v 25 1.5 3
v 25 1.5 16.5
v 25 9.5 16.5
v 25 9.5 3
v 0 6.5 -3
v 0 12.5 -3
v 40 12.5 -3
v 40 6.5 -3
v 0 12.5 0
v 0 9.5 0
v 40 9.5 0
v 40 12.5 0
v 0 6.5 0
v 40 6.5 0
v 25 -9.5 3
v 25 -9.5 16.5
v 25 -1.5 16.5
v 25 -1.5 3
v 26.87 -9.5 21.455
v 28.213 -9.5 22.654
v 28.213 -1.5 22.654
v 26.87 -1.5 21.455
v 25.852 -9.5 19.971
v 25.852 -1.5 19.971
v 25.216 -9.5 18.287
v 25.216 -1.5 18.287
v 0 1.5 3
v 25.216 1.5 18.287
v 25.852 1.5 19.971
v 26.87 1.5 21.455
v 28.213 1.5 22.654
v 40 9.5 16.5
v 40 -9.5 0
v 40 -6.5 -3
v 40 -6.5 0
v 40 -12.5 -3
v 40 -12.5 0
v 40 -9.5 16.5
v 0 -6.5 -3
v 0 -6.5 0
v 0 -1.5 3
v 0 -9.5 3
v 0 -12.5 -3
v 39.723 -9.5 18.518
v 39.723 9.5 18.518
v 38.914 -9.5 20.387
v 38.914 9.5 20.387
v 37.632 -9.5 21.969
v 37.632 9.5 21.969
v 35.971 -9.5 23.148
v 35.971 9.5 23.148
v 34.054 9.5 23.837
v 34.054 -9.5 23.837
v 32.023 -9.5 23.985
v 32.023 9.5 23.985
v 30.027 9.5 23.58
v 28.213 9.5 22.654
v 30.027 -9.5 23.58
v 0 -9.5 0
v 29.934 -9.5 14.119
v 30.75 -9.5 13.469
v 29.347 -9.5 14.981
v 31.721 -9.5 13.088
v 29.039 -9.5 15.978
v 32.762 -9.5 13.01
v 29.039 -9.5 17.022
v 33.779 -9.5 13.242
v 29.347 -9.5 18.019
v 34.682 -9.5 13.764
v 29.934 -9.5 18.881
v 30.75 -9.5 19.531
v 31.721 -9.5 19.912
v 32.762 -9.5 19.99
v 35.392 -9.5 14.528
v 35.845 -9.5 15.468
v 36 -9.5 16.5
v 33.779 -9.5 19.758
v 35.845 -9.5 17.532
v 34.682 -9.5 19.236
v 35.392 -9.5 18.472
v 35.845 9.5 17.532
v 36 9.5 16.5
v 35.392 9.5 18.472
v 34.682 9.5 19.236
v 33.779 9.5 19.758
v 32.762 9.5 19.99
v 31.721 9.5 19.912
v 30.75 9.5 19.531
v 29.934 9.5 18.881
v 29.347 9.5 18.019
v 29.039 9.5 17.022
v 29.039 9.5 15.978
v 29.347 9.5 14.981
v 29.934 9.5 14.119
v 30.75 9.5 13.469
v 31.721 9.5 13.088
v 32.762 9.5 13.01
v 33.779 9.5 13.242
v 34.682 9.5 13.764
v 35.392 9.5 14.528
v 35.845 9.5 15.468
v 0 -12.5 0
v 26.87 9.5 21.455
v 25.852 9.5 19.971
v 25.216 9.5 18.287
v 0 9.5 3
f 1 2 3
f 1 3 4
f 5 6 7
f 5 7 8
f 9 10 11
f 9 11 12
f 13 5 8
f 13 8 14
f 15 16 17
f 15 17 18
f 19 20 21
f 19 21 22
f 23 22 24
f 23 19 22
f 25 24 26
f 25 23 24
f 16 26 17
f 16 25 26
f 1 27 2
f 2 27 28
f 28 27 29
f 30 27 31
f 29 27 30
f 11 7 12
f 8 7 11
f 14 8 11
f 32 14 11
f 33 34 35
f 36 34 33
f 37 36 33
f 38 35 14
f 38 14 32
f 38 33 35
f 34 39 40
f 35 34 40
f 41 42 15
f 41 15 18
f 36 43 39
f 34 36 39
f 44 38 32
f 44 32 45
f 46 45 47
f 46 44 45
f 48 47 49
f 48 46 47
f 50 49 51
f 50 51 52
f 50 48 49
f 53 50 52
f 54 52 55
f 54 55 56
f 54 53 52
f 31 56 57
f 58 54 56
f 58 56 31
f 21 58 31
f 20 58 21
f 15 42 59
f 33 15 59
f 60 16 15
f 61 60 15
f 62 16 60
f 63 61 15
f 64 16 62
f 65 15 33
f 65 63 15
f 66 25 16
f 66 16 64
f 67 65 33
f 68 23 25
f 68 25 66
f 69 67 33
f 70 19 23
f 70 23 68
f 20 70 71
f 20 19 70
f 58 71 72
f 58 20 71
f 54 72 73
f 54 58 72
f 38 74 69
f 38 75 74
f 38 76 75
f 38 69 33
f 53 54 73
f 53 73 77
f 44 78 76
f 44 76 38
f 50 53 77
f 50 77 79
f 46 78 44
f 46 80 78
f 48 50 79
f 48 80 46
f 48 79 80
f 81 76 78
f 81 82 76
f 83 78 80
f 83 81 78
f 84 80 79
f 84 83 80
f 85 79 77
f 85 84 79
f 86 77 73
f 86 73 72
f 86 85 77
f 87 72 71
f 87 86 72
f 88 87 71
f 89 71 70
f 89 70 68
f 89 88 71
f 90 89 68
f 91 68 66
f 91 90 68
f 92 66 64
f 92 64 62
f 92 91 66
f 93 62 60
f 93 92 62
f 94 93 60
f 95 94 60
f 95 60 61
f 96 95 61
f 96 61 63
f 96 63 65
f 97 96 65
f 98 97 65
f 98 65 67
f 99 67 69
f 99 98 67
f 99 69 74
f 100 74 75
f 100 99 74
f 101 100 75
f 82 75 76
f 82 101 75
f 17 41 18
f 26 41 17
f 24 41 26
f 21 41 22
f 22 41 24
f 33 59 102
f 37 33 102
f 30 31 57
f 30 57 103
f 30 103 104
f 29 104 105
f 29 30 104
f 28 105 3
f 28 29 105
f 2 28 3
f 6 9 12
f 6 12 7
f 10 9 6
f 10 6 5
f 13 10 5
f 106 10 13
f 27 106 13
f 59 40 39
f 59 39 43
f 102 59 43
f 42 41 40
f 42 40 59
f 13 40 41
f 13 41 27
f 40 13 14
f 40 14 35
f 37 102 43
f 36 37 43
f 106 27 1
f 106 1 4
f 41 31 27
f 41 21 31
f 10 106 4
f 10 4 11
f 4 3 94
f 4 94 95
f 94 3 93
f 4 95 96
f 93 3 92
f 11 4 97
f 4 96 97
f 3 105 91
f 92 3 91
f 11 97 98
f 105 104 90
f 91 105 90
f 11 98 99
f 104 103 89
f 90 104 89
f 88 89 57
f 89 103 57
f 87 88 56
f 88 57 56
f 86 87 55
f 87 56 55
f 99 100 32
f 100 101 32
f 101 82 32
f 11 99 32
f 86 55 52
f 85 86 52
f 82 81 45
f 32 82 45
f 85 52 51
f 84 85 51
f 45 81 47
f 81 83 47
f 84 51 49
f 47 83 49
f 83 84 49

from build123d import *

# Parameters (mm, degrees)
F1_DEPTH = 40
F3_R     = 3.5
F4_DEPTH = 9.5
F5_DEPTH = 1.5


with BuildPart() as f1:
    # F0 (on Right) → F1 (new body)
    with BuildSketch(Plane.YZ):
        Polygon((-6.5, 0), (0, 0), (0, 3), (-9.5, 3), (-9.5, 0), (-12.5, 0), (-12.5, -3), (-6.5, -3), align=None)
    extrude(amount=F1_DEPTH)

    # F2: F1 across plane


with BuildPart() as f1_1:
    add(f1.part)
    add(f1.part.mirror(Plane.XZ))

    # F3 (on Front) → F4 (join, symmetric)
    with BuildSketch(Plane.XZ):
        with BuildLine():
            Line((25, 3), (40, 3))
            Line((40, 3), (40, 16.5))
            ThreePointArc((40, 16.5), (35.971113, 23.148412), (28.212967, 22.65397))
            ThreePointArc((28.212967, 22.65397), (25.851588, 19.971113), (25, 16.5))
            Line((25, 16.5), (25, 3))
        make_face()
        with Locations((32.5, 16.5)):
            Circle(F3_R, mode=Mode.SUBTRACT)
    extrude(amount=F4_DEPTH, both=True)

    # F3 (on Front) → F5 (join, symmetric)
    with BuildSketch(Plane.XZ):
        with BuildLine():
            Line((0, 3), (25, 3))
            Line((25, 3), (25, 16.5))
            ThreePointArc((25, 16.5), (25.851588, 19.971113), (28.212967, 22.65397))
            Line((28.212967, 22.65397), (0, 3))
        make_face()
    extrude(amount=F5_DEPTH, both=True)


solid = f1_1.part
